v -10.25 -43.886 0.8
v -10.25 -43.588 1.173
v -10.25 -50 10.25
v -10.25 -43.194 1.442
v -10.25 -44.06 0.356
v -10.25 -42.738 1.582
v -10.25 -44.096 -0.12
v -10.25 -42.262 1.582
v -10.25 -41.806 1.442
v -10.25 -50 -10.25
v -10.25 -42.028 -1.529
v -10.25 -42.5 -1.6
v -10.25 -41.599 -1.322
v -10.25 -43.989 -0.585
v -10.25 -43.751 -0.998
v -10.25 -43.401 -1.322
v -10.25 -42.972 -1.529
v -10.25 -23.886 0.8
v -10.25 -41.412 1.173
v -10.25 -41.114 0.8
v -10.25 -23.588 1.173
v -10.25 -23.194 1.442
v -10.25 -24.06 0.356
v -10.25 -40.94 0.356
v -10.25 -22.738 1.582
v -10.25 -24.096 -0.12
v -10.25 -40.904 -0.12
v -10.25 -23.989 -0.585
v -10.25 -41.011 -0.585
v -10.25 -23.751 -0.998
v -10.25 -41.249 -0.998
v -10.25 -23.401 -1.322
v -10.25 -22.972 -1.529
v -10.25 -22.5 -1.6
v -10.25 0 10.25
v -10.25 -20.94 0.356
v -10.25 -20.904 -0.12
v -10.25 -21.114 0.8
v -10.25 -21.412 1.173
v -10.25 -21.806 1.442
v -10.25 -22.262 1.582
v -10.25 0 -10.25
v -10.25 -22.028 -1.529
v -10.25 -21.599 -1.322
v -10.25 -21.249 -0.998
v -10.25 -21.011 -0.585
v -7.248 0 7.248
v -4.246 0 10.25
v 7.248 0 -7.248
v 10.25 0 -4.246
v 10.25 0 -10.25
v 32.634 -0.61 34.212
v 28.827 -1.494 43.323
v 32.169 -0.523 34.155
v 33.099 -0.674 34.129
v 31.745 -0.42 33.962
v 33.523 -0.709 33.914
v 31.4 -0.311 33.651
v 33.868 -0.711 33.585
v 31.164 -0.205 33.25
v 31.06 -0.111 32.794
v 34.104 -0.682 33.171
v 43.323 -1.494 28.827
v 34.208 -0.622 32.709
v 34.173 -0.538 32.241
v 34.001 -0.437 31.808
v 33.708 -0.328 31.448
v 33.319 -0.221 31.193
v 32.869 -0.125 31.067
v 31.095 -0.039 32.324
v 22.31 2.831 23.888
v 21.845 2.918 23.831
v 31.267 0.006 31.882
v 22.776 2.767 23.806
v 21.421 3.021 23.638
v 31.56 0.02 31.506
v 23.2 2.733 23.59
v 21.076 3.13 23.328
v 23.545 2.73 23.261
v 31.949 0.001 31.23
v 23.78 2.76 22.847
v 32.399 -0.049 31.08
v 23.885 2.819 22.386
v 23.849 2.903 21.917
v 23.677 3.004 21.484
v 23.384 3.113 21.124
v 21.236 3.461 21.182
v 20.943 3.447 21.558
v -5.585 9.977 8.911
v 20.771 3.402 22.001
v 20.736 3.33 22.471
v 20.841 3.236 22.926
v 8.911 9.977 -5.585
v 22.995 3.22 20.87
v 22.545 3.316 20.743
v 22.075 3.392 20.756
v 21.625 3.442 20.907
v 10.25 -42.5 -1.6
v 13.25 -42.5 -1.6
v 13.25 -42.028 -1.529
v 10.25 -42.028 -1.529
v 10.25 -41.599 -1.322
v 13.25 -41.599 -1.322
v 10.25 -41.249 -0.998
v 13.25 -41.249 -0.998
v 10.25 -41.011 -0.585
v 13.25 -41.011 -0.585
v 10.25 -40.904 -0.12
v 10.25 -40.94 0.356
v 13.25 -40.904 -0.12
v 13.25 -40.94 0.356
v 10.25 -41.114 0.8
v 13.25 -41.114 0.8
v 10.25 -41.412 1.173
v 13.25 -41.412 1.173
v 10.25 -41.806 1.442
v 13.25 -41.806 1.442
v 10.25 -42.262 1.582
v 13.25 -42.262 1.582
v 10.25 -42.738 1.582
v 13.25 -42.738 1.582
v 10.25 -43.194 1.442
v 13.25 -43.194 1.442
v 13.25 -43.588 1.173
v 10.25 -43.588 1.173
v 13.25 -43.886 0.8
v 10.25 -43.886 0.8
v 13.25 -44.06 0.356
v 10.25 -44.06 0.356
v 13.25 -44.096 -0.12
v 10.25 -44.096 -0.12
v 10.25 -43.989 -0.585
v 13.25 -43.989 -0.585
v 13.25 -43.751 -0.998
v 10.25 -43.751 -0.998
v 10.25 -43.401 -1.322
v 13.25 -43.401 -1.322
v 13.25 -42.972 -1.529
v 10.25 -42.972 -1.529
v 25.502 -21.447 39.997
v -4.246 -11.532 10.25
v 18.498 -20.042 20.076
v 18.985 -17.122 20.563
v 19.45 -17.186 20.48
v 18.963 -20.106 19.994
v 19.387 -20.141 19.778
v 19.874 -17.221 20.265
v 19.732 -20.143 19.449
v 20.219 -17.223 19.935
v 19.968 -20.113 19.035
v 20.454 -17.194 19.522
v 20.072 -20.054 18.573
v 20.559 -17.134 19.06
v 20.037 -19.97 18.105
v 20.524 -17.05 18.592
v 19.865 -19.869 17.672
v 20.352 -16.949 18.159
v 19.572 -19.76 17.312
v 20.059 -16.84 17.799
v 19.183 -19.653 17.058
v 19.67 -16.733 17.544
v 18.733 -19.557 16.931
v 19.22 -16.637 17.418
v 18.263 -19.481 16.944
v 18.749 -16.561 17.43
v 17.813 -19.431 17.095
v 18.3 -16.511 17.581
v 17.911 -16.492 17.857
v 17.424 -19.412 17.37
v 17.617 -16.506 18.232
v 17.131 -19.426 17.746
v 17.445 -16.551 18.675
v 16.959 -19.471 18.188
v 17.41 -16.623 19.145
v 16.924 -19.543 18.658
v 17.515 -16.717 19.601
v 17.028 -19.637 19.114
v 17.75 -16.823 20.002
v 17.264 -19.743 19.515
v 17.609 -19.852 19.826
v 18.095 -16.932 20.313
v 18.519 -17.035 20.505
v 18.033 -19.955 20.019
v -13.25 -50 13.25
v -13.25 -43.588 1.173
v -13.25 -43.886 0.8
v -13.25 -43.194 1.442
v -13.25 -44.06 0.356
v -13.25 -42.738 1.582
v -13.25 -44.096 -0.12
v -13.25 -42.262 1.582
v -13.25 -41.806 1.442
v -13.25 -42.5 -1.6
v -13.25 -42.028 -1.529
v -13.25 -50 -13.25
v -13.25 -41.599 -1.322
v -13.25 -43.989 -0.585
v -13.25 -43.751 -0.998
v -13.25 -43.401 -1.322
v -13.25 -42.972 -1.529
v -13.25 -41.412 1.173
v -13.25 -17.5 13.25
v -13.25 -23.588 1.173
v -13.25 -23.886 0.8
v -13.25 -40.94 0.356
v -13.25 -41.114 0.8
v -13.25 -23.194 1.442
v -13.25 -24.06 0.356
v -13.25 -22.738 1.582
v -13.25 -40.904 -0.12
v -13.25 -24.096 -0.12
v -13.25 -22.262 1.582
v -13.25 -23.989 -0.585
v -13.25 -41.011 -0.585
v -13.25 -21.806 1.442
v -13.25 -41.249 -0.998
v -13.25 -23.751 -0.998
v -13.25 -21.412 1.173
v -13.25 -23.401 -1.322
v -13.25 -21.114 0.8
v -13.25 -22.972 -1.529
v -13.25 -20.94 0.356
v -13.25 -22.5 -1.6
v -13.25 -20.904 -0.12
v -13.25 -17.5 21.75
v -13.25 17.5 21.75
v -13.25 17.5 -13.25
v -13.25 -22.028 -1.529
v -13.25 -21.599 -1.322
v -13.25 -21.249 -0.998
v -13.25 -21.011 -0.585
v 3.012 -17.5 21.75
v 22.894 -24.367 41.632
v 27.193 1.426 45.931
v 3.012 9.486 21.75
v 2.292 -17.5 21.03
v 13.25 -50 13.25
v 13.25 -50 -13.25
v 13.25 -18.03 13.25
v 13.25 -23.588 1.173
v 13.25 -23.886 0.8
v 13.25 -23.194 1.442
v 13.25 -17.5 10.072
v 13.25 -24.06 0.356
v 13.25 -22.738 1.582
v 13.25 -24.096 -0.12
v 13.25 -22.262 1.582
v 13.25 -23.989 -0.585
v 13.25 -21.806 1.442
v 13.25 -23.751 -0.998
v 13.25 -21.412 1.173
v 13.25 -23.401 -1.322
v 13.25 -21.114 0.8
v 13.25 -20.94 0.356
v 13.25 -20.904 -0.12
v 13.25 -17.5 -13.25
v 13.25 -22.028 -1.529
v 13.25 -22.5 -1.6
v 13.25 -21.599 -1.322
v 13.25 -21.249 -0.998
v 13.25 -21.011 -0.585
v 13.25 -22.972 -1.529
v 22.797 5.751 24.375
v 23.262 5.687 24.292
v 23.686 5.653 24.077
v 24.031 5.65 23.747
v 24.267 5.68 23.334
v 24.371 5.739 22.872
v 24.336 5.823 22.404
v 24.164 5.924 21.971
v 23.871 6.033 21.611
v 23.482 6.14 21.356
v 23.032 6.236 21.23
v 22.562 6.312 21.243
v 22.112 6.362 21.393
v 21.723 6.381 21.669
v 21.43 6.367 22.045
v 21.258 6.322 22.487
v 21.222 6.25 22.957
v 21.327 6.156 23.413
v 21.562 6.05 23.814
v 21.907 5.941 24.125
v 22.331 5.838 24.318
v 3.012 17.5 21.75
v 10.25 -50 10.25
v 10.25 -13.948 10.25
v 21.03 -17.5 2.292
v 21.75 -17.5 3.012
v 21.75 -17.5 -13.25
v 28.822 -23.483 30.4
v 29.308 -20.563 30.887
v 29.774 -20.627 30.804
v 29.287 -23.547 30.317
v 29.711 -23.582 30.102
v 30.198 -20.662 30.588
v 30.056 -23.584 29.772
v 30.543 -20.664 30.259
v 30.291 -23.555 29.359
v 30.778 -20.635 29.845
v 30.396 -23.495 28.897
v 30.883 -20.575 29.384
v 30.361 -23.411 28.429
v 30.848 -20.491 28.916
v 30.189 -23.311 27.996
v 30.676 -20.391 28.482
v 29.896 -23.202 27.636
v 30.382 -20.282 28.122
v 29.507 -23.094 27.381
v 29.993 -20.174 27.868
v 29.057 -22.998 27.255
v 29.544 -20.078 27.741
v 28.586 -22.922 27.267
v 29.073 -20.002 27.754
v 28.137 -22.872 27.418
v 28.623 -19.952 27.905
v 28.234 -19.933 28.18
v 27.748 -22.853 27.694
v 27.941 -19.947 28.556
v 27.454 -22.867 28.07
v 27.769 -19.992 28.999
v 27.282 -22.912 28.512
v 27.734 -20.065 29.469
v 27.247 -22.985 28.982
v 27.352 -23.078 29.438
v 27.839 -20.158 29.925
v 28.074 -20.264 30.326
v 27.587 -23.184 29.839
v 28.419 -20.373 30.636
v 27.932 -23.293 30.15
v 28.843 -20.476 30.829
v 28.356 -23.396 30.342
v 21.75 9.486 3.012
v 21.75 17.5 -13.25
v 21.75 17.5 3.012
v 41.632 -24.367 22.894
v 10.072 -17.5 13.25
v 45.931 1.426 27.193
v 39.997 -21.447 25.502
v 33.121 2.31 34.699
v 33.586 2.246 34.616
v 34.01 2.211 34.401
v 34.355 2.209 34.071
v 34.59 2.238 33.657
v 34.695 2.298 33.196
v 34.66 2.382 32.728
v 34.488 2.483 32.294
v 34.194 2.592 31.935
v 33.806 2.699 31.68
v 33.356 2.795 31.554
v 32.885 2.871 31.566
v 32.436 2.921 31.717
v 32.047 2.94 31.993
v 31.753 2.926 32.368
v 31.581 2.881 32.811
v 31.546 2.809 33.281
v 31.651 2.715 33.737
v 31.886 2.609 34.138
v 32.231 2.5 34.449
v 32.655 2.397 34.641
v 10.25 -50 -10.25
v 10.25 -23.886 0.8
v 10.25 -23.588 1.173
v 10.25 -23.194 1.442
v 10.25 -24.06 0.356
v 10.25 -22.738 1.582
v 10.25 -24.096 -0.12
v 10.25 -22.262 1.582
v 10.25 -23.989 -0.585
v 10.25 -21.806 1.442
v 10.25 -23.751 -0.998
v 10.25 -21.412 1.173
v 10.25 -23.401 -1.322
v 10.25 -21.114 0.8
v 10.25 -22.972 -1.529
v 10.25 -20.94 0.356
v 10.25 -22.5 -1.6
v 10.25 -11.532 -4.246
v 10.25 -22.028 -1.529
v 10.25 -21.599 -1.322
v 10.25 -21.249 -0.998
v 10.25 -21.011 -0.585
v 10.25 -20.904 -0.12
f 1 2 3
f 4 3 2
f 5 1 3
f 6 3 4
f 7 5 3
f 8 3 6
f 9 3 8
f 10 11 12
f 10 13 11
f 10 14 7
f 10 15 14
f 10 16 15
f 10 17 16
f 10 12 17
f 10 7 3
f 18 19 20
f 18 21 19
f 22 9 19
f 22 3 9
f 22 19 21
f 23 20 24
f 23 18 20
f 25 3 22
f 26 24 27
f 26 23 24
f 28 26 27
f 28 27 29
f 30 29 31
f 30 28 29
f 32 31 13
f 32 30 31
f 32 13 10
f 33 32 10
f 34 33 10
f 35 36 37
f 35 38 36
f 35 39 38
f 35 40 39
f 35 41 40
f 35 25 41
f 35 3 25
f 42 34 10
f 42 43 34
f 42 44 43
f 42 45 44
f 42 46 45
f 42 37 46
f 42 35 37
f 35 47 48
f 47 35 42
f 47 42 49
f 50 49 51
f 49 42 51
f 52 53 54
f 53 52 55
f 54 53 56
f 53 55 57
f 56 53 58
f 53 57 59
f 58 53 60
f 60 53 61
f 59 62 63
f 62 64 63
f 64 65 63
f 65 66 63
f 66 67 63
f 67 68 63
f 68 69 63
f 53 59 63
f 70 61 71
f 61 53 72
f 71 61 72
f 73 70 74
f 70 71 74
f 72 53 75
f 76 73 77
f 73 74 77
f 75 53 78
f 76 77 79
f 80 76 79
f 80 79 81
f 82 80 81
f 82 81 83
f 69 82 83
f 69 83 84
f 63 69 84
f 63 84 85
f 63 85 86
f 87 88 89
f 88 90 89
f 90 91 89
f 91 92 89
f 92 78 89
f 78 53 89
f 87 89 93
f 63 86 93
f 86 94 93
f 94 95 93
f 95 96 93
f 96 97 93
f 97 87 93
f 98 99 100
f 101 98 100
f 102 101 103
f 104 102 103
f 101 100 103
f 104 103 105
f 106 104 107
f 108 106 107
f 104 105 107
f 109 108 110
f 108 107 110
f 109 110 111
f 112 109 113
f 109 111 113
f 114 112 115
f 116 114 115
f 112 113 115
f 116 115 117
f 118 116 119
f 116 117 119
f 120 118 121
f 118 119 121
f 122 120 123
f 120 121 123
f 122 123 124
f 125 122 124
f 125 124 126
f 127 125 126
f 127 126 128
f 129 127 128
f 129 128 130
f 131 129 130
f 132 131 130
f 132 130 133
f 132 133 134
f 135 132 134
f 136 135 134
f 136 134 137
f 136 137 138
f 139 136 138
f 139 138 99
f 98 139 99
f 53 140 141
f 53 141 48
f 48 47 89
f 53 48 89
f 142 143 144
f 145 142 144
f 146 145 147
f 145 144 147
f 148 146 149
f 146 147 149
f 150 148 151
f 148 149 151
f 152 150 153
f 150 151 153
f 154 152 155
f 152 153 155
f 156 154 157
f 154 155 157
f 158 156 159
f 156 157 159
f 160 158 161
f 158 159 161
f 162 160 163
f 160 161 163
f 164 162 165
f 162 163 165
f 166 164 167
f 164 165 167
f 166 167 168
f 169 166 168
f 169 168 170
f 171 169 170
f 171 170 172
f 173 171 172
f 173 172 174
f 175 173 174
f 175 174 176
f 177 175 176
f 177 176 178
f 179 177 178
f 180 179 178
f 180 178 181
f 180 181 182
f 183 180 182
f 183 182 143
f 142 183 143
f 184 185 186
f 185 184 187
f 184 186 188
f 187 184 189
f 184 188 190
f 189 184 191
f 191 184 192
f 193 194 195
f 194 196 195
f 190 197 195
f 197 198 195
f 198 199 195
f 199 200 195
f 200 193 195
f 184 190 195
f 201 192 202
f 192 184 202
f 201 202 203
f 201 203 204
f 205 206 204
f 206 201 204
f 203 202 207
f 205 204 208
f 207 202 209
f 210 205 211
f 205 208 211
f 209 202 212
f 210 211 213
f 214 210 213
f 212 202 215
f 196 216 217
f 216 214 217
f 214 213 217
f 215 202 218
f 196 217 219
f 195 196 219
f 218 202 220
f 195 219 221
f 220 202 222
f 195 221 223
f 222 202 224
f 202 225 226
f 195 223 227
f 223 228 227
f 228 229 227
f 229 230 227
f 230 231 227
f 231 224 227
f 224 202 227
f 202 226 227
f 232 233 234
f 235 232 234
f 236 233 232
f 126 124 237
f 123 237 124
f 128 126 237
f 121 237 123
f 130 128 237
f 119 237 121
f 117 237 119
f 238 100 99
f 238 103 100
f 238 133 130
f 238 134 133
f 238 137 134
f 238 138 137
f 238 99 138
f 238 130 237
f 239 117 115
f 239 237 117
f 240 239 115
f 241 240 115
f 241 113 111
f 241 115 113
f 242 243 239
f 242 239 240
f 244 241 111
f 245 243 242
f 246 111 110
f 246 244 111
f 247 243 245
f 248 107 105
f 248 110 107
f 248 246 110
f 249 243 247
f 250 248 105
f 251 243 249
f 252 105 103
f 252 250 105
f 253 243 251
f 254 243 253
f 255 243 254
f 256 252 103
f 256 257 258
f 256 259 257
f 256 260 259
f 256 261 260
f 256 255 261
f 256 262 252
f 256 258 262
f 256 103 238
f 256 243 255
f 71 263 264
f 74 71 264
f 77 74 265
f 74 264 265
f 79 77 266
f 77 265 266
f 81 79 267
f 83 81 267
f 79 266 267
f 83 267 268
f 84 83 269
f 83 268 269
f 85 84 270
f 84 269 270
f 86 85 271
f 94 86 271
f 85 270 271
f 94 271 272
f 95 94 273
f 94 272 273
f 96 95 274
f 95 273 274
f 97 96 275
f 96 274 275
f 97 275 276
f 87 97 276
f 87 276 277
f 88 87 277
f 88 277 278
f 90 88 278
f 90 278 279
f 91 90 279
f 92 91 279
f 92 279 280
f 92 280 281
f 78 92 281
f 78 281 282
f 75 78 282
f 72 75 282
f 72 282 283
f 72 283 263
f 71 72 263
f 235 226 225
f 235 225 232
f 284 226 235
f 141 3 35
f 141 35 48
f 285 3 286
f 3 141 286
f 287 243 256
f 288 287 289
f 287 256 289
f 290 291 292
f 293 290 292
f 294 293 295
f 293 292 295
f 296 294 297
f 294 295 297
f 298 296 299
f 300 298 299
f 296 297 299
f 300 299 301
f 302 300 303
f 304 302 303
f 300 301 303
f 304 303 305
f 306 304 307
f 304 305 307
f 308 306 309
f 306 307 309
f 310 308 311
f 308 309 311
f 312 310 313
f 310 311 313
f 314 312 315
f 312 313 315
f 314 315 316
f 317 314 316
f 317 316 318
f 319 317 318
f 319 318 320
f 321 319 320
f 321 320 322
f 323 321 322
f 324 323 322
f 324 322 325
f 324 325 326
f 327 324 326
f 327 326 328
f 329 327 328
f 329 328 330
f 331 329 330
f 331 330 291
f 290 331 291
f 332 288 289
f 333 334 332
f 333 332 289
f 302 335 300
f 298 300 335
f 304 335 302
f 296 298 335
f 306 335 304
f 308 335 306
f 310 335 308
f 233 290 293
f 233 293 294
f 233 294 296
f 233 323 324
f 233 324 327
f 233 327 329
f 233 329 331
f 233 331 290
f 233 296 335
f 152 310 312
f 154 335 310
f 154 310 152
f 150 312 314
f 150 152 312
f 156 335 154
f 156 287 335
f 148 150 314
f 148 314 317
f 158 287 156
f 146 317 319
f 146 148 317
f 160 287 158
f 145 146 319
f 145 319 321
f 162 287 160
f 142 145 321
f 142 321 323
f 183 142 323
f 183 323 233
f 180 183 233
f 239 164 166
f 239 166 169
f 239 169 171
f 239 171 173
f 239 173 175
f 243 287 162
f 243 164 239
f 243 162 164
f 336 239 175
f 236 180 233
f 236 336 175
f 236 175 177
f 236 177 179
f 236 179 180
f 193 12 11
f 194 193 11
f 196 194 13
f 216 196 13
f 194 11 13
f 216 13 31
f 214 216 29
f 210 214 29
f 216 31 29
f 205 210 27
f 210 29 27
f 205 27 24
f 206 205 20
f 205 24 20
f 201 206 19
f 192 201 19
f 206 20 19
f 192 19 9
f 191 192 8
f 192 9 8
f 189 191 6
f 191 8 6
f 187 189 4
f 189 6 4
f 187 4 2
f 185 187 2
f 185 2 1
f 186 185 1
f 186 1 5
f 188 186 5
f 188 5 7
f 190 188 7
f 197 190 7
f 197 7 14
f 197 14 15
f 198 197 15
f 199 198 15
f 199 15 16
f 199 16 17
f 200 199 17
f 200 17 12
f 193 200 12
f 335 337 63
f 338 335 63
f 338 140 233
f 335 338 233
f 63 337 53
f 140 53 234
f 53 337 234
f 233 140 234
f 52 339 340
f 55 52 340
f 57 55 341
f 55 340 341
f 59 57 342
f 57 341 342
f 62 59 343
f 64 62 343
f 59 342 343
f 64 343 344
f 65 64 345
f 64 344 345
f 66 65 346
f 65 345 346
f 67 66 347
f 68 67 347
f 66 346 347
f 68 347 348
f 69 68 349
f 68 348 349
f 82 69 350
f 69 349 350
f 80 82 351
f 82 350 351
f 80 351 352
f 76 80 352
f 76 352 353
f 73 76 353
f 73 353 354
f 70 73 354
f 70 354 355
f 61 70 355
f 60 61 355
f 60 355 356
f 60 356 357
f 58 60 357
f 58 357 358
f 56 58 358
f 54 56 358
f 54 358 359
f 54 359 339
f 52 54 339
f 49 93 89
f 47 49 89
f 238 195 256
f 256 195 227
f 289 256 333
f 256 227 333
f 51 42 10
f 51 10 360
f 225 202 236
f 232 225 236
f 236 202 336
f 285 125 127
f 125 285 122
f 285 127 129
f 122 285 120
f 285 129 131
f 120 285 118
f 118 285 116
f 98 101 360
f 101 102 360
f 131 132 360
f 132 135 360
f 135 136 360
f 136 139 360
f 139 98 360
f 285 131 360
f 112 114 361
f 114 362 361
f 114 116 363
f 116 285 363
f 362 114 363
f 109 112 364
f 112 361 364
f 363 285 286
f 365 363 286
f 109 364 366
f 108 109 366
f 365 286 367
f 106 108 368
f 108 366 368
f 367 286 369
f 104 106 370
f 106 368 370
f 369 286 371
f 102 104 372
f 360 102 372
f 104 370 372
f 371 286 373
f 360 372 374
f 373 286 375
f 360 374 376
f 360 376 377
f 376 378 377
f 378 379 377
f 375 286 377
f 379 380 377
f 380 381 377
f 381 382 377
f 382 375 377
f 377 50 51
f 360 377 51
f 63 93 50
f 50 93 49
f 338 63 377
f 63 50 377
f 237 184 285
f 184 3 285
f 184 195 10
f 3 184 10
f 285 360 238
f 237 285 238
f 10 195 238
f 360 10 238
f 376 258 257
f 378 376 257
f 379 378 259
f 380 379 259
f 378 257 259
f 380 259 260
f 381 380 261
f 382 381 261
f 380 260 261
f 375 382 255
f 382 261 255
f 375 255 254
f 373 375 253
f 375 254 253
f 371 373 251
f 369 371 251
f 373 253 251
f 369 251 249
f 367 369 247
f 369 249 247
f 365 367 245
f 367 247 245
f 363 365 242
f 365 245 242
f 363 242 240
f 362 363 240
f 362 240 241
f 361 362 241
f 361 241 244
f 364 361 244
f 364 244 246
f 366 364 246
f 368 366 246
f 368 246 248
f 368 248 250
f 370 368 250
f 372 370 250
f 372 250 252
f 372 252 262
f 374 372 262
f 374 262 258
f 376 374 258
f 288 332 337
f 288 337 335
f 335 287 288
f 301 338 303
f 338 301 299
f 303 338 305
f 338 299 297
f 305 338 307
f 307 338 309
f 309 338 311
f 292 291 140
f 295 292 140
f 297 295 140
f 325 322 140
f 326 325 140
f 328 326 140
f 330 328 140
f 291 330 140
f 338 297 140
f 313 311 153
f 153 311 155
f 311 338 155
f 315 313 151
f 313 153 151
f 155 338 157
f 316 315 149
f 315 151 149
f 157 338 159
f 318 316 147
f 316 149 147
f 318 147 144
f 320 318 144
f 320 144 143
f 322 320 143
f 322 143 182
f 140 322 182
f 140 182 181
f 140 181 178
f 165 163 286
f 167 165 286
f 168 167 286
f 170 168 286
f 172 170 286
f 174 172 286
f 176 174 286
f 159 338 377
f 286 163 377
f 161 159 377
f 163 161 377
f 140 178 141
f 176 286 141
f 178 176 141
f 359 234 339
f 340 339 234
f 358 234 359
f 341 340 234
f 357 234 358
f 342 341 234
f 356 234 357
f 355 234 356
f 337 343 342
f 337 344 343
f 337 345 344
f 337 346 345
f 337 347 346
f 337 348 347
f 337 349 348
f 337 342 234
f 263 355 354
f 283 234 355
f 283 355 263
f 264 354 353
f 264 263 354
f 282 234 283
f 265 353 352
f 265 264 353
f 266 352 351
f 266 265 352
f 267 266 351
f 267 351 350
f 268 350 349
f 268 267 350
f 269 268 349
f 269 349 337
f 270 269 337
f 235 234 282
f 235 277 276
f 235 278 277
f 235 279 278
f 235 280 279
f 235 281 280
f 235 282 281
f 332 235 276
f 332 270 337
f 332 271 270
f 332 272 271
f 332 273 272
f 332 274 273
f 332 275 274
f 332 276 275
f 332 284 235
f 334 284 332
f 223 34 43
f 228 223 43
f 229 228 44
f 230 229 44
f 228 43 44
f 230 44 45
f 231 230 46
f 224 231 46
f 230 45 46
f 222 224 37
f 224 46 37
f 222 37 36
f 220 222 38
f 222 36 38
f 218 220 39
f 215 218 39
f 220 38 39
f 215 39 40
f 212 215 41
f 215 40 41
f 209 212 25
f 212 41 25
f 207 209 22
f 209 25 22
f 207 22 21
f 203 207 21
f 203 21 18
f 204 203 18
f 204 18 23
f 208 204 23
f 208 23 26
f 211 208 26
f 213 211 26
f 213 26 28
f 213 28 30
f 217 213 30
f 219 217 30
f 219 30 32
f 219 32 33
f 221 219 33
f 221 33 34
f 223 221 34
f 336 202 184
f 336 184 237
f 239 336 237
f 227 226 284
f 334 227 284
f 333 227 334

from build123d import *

# Parameters (mm, degrees)
SKETCH_4_W          = 26.5
SKETCH_4_H          = 26.5
SKETCH_4_W_2        = 20.5
SKETCH_4_H_2        = 20.5
EXTRUDE_1_DEPTH     = 50
EXTRUDE_2_DEPTH     = 50
EXTRUDE_3_DEPTH     = 17.5
SKETCH_4_2_W        = 20.5
SKETCH_4_2_H        = 20.5
CUT_EXTRUDE_1_DEPTH = 82.971372719
CUT_EXTRUDE_2_DEPTH = 82.971372719
CUT_EXTRUDE_3_REACH = 90.259
SKETCH_7_R          = 1.6
SKETCH_9_R          = 1.6
CUT_EXTRUDE_4_DEPTH = 76.350501248


with BuildPart() as part:
    # 草图4 → 凸台-拉伸1 (new body)
    with BuildSketch(Plane(origin=(0, 0, 0), x_dir=(1, 0, 0), z_dir=(0, 1, 0))):
        Rectangle(SKETCH_4_W, SKETCH_4_H)
        Rectangle(SKETCH_4_W_2, SKETCH_4_H_2, mode=Mode.SUBTRACT)
    extrude(amount=-EXTRUDE_1_DEPTH)

    # 草图5 → 凸台-拉伸2 (add)
    with BuildSketch(Plane(origin=(0, 0, 0), x_dir=(0.7254762501100117, 0.21764287503300356, -0.6529286250990104), z_dir=(0.6882472016116853, -0.22941573387056186, 0.6882472016116854))):
        Polygon((-9.951712437, 15.877292577), (15.877292577, 9.951712437), (9.951712437, -15.877292577), (-15.877292577, -9.951712437), align=None)
        Polygon((-7.698494526, 12.28243388), (12.28243388, 7.698494526), (7.698494526, -12.28243388), (-12.28243388, -7.698494526), align=None, mode=Mode.SUBTRACT)
    extrude(amount=EXTRUDE_2_DEPTH)

    # 草图6 → 凸台-拉伸3 (add, symmetric)
    with BuildSketch(Plane(origin=(0, 0, 0), x_dir=(1, 0, 0), z_dir=(0, 1, 0))):
        Polygon((-13.25, 13.25), (-13.25, -21.75), (3.011670299, -21.75), (21.75, -3.011670299), (21.75, 13.25), align=None)
    extrude(amount=EXTRUDE_3_DEPTH, both=True)

    # 草图4<2> → 切除-拉伸1 (cut, through all)
    with BuildSketch(Plane(origin=(0, 0, 0), x_dir=(1, 0, 0), z_dir=(0, 1, 0))):
        Rectangle(SKETCH_4_2_W, SKETCH_4_2_H)
    extrude(amount=-CUT_EXTRUDE_1_DEPTH, mode=Mode.SUBTRACT)

    # 草图5<2> → 切除-拉伸2 (cut, through all)
    with BuildSketch(Plane(origin=(0, 0, 0), x_dir=(0.7254762501100117, 0.21764287503300356, -0.6529286250990104), z_dir=(0.6882472016116853, -0.22941573387056186, 0.6882472016116854))):
        Polygon((12.28243388, 7.698494526), (7.698494526, -12.28243388), (-12.28243388, -7.698494526), (-7.698494526, 12.28243388), align=None)
    extrude(amount=CUT_EXTRUDE_2_DEPTH, mode=Mode.SUBTRACT)

    # 切除-拉伸3: up to this face of the body (flat: up to its plane)
    cut_extrude_3_end = Plane(part.part.faces().sort_by_distance((22.026190668, -20.955144479, 22.026190668))[0])
    # 草图7 → 切除-拉伸3 (cut, up to the picked face)
    with BuildSketch(Plane(origin=(2.14943383, 12.89660298, 2.14943383), x_dir=(0.9867543820659302, -0.16001422411879954, -0.02666903735313327), z_dir=(0.16222142113076257, 0.9733285267845753, 0.16222142113076257)), mode=Mode.PRIVATE) as cut_extrude_3_sk1:
        with Locations(Location((31.386862461, -32.246935744, 0), (0, 0, 270))):
            Circle(SKETCH_7_R)
    cut_extrude_3_tool1 = split(extrude(cut_extrude_3_sk1.sketch, amount=-CUT_EXTRUDE_3_REACH, mode=Mode.PRIVATE), bisect_by=cut_extrude_3_end, keep=Keep.BOTH, mode=Mode.PRIVATE)
    # 草图7 → 切除-拉伸3 (cut, up to the picked face)
    with BuildSketch(Plane(origin=(2.14943383, 12.89660298, 2.14943383), x_dir=(0.9867543820659302, -0.16001422411879954, -0.02666903735313327), z_dir=(0.16222142113076257, 0.9733285267845753, 0.16222142113076257)), mode=Mode.PRIVATE) as cut_extrude_3_sk2:
        with Locations(Location((20.924574974, -21.497957163, 0), (0, 0, 270))):
            Circle(SKETCH_7_R)
    cut_extrude_3_tool2 = split(extrude(cut_extrude_3_sk2.sketch, amount=-CUT_EXTRUDE_3_REACH, mode=Mode.PRIVATE), bisect_by=cut_extrude_3_end, keep=Keep.BOTH, mode=Mode.PRIVATE)
    add(cut_extrude_3_tool1.solids().sort_by(Axis((33.120558, 2.572895, 33.120558), (-0.16222142113076257, -0.9733285267845753, -0.16222142113076257)))[0], mode=Mode.SUBTRACT)
    add(cut_extrude_3_tool2.solids().sort_by(Axis((22.79685, 6.014131, 22.79685), (-0.16222142113076257, -0.9733285267845753, -0.16222142113076257)))[0], mode=Mode.SUBTRACT)

    # 草图9 → 切除-拉伸4 (cut, through all)
    with BuildSketch(Plane(origin=(13.25, 0, 0), x_dir=(0, 0, -1), z_dir=(1, 0, 0))):
        with Locations((0, -42.5)):
            Circle(SKETCH_9_R)
        with Locations((0, -22.5)):
            Circle(SKETCH_9_R)
    extrude(amount=-CUT_EXTRUDE_4_DEPTH, mode=Mode.SUBTRACT)


solid = part.part
